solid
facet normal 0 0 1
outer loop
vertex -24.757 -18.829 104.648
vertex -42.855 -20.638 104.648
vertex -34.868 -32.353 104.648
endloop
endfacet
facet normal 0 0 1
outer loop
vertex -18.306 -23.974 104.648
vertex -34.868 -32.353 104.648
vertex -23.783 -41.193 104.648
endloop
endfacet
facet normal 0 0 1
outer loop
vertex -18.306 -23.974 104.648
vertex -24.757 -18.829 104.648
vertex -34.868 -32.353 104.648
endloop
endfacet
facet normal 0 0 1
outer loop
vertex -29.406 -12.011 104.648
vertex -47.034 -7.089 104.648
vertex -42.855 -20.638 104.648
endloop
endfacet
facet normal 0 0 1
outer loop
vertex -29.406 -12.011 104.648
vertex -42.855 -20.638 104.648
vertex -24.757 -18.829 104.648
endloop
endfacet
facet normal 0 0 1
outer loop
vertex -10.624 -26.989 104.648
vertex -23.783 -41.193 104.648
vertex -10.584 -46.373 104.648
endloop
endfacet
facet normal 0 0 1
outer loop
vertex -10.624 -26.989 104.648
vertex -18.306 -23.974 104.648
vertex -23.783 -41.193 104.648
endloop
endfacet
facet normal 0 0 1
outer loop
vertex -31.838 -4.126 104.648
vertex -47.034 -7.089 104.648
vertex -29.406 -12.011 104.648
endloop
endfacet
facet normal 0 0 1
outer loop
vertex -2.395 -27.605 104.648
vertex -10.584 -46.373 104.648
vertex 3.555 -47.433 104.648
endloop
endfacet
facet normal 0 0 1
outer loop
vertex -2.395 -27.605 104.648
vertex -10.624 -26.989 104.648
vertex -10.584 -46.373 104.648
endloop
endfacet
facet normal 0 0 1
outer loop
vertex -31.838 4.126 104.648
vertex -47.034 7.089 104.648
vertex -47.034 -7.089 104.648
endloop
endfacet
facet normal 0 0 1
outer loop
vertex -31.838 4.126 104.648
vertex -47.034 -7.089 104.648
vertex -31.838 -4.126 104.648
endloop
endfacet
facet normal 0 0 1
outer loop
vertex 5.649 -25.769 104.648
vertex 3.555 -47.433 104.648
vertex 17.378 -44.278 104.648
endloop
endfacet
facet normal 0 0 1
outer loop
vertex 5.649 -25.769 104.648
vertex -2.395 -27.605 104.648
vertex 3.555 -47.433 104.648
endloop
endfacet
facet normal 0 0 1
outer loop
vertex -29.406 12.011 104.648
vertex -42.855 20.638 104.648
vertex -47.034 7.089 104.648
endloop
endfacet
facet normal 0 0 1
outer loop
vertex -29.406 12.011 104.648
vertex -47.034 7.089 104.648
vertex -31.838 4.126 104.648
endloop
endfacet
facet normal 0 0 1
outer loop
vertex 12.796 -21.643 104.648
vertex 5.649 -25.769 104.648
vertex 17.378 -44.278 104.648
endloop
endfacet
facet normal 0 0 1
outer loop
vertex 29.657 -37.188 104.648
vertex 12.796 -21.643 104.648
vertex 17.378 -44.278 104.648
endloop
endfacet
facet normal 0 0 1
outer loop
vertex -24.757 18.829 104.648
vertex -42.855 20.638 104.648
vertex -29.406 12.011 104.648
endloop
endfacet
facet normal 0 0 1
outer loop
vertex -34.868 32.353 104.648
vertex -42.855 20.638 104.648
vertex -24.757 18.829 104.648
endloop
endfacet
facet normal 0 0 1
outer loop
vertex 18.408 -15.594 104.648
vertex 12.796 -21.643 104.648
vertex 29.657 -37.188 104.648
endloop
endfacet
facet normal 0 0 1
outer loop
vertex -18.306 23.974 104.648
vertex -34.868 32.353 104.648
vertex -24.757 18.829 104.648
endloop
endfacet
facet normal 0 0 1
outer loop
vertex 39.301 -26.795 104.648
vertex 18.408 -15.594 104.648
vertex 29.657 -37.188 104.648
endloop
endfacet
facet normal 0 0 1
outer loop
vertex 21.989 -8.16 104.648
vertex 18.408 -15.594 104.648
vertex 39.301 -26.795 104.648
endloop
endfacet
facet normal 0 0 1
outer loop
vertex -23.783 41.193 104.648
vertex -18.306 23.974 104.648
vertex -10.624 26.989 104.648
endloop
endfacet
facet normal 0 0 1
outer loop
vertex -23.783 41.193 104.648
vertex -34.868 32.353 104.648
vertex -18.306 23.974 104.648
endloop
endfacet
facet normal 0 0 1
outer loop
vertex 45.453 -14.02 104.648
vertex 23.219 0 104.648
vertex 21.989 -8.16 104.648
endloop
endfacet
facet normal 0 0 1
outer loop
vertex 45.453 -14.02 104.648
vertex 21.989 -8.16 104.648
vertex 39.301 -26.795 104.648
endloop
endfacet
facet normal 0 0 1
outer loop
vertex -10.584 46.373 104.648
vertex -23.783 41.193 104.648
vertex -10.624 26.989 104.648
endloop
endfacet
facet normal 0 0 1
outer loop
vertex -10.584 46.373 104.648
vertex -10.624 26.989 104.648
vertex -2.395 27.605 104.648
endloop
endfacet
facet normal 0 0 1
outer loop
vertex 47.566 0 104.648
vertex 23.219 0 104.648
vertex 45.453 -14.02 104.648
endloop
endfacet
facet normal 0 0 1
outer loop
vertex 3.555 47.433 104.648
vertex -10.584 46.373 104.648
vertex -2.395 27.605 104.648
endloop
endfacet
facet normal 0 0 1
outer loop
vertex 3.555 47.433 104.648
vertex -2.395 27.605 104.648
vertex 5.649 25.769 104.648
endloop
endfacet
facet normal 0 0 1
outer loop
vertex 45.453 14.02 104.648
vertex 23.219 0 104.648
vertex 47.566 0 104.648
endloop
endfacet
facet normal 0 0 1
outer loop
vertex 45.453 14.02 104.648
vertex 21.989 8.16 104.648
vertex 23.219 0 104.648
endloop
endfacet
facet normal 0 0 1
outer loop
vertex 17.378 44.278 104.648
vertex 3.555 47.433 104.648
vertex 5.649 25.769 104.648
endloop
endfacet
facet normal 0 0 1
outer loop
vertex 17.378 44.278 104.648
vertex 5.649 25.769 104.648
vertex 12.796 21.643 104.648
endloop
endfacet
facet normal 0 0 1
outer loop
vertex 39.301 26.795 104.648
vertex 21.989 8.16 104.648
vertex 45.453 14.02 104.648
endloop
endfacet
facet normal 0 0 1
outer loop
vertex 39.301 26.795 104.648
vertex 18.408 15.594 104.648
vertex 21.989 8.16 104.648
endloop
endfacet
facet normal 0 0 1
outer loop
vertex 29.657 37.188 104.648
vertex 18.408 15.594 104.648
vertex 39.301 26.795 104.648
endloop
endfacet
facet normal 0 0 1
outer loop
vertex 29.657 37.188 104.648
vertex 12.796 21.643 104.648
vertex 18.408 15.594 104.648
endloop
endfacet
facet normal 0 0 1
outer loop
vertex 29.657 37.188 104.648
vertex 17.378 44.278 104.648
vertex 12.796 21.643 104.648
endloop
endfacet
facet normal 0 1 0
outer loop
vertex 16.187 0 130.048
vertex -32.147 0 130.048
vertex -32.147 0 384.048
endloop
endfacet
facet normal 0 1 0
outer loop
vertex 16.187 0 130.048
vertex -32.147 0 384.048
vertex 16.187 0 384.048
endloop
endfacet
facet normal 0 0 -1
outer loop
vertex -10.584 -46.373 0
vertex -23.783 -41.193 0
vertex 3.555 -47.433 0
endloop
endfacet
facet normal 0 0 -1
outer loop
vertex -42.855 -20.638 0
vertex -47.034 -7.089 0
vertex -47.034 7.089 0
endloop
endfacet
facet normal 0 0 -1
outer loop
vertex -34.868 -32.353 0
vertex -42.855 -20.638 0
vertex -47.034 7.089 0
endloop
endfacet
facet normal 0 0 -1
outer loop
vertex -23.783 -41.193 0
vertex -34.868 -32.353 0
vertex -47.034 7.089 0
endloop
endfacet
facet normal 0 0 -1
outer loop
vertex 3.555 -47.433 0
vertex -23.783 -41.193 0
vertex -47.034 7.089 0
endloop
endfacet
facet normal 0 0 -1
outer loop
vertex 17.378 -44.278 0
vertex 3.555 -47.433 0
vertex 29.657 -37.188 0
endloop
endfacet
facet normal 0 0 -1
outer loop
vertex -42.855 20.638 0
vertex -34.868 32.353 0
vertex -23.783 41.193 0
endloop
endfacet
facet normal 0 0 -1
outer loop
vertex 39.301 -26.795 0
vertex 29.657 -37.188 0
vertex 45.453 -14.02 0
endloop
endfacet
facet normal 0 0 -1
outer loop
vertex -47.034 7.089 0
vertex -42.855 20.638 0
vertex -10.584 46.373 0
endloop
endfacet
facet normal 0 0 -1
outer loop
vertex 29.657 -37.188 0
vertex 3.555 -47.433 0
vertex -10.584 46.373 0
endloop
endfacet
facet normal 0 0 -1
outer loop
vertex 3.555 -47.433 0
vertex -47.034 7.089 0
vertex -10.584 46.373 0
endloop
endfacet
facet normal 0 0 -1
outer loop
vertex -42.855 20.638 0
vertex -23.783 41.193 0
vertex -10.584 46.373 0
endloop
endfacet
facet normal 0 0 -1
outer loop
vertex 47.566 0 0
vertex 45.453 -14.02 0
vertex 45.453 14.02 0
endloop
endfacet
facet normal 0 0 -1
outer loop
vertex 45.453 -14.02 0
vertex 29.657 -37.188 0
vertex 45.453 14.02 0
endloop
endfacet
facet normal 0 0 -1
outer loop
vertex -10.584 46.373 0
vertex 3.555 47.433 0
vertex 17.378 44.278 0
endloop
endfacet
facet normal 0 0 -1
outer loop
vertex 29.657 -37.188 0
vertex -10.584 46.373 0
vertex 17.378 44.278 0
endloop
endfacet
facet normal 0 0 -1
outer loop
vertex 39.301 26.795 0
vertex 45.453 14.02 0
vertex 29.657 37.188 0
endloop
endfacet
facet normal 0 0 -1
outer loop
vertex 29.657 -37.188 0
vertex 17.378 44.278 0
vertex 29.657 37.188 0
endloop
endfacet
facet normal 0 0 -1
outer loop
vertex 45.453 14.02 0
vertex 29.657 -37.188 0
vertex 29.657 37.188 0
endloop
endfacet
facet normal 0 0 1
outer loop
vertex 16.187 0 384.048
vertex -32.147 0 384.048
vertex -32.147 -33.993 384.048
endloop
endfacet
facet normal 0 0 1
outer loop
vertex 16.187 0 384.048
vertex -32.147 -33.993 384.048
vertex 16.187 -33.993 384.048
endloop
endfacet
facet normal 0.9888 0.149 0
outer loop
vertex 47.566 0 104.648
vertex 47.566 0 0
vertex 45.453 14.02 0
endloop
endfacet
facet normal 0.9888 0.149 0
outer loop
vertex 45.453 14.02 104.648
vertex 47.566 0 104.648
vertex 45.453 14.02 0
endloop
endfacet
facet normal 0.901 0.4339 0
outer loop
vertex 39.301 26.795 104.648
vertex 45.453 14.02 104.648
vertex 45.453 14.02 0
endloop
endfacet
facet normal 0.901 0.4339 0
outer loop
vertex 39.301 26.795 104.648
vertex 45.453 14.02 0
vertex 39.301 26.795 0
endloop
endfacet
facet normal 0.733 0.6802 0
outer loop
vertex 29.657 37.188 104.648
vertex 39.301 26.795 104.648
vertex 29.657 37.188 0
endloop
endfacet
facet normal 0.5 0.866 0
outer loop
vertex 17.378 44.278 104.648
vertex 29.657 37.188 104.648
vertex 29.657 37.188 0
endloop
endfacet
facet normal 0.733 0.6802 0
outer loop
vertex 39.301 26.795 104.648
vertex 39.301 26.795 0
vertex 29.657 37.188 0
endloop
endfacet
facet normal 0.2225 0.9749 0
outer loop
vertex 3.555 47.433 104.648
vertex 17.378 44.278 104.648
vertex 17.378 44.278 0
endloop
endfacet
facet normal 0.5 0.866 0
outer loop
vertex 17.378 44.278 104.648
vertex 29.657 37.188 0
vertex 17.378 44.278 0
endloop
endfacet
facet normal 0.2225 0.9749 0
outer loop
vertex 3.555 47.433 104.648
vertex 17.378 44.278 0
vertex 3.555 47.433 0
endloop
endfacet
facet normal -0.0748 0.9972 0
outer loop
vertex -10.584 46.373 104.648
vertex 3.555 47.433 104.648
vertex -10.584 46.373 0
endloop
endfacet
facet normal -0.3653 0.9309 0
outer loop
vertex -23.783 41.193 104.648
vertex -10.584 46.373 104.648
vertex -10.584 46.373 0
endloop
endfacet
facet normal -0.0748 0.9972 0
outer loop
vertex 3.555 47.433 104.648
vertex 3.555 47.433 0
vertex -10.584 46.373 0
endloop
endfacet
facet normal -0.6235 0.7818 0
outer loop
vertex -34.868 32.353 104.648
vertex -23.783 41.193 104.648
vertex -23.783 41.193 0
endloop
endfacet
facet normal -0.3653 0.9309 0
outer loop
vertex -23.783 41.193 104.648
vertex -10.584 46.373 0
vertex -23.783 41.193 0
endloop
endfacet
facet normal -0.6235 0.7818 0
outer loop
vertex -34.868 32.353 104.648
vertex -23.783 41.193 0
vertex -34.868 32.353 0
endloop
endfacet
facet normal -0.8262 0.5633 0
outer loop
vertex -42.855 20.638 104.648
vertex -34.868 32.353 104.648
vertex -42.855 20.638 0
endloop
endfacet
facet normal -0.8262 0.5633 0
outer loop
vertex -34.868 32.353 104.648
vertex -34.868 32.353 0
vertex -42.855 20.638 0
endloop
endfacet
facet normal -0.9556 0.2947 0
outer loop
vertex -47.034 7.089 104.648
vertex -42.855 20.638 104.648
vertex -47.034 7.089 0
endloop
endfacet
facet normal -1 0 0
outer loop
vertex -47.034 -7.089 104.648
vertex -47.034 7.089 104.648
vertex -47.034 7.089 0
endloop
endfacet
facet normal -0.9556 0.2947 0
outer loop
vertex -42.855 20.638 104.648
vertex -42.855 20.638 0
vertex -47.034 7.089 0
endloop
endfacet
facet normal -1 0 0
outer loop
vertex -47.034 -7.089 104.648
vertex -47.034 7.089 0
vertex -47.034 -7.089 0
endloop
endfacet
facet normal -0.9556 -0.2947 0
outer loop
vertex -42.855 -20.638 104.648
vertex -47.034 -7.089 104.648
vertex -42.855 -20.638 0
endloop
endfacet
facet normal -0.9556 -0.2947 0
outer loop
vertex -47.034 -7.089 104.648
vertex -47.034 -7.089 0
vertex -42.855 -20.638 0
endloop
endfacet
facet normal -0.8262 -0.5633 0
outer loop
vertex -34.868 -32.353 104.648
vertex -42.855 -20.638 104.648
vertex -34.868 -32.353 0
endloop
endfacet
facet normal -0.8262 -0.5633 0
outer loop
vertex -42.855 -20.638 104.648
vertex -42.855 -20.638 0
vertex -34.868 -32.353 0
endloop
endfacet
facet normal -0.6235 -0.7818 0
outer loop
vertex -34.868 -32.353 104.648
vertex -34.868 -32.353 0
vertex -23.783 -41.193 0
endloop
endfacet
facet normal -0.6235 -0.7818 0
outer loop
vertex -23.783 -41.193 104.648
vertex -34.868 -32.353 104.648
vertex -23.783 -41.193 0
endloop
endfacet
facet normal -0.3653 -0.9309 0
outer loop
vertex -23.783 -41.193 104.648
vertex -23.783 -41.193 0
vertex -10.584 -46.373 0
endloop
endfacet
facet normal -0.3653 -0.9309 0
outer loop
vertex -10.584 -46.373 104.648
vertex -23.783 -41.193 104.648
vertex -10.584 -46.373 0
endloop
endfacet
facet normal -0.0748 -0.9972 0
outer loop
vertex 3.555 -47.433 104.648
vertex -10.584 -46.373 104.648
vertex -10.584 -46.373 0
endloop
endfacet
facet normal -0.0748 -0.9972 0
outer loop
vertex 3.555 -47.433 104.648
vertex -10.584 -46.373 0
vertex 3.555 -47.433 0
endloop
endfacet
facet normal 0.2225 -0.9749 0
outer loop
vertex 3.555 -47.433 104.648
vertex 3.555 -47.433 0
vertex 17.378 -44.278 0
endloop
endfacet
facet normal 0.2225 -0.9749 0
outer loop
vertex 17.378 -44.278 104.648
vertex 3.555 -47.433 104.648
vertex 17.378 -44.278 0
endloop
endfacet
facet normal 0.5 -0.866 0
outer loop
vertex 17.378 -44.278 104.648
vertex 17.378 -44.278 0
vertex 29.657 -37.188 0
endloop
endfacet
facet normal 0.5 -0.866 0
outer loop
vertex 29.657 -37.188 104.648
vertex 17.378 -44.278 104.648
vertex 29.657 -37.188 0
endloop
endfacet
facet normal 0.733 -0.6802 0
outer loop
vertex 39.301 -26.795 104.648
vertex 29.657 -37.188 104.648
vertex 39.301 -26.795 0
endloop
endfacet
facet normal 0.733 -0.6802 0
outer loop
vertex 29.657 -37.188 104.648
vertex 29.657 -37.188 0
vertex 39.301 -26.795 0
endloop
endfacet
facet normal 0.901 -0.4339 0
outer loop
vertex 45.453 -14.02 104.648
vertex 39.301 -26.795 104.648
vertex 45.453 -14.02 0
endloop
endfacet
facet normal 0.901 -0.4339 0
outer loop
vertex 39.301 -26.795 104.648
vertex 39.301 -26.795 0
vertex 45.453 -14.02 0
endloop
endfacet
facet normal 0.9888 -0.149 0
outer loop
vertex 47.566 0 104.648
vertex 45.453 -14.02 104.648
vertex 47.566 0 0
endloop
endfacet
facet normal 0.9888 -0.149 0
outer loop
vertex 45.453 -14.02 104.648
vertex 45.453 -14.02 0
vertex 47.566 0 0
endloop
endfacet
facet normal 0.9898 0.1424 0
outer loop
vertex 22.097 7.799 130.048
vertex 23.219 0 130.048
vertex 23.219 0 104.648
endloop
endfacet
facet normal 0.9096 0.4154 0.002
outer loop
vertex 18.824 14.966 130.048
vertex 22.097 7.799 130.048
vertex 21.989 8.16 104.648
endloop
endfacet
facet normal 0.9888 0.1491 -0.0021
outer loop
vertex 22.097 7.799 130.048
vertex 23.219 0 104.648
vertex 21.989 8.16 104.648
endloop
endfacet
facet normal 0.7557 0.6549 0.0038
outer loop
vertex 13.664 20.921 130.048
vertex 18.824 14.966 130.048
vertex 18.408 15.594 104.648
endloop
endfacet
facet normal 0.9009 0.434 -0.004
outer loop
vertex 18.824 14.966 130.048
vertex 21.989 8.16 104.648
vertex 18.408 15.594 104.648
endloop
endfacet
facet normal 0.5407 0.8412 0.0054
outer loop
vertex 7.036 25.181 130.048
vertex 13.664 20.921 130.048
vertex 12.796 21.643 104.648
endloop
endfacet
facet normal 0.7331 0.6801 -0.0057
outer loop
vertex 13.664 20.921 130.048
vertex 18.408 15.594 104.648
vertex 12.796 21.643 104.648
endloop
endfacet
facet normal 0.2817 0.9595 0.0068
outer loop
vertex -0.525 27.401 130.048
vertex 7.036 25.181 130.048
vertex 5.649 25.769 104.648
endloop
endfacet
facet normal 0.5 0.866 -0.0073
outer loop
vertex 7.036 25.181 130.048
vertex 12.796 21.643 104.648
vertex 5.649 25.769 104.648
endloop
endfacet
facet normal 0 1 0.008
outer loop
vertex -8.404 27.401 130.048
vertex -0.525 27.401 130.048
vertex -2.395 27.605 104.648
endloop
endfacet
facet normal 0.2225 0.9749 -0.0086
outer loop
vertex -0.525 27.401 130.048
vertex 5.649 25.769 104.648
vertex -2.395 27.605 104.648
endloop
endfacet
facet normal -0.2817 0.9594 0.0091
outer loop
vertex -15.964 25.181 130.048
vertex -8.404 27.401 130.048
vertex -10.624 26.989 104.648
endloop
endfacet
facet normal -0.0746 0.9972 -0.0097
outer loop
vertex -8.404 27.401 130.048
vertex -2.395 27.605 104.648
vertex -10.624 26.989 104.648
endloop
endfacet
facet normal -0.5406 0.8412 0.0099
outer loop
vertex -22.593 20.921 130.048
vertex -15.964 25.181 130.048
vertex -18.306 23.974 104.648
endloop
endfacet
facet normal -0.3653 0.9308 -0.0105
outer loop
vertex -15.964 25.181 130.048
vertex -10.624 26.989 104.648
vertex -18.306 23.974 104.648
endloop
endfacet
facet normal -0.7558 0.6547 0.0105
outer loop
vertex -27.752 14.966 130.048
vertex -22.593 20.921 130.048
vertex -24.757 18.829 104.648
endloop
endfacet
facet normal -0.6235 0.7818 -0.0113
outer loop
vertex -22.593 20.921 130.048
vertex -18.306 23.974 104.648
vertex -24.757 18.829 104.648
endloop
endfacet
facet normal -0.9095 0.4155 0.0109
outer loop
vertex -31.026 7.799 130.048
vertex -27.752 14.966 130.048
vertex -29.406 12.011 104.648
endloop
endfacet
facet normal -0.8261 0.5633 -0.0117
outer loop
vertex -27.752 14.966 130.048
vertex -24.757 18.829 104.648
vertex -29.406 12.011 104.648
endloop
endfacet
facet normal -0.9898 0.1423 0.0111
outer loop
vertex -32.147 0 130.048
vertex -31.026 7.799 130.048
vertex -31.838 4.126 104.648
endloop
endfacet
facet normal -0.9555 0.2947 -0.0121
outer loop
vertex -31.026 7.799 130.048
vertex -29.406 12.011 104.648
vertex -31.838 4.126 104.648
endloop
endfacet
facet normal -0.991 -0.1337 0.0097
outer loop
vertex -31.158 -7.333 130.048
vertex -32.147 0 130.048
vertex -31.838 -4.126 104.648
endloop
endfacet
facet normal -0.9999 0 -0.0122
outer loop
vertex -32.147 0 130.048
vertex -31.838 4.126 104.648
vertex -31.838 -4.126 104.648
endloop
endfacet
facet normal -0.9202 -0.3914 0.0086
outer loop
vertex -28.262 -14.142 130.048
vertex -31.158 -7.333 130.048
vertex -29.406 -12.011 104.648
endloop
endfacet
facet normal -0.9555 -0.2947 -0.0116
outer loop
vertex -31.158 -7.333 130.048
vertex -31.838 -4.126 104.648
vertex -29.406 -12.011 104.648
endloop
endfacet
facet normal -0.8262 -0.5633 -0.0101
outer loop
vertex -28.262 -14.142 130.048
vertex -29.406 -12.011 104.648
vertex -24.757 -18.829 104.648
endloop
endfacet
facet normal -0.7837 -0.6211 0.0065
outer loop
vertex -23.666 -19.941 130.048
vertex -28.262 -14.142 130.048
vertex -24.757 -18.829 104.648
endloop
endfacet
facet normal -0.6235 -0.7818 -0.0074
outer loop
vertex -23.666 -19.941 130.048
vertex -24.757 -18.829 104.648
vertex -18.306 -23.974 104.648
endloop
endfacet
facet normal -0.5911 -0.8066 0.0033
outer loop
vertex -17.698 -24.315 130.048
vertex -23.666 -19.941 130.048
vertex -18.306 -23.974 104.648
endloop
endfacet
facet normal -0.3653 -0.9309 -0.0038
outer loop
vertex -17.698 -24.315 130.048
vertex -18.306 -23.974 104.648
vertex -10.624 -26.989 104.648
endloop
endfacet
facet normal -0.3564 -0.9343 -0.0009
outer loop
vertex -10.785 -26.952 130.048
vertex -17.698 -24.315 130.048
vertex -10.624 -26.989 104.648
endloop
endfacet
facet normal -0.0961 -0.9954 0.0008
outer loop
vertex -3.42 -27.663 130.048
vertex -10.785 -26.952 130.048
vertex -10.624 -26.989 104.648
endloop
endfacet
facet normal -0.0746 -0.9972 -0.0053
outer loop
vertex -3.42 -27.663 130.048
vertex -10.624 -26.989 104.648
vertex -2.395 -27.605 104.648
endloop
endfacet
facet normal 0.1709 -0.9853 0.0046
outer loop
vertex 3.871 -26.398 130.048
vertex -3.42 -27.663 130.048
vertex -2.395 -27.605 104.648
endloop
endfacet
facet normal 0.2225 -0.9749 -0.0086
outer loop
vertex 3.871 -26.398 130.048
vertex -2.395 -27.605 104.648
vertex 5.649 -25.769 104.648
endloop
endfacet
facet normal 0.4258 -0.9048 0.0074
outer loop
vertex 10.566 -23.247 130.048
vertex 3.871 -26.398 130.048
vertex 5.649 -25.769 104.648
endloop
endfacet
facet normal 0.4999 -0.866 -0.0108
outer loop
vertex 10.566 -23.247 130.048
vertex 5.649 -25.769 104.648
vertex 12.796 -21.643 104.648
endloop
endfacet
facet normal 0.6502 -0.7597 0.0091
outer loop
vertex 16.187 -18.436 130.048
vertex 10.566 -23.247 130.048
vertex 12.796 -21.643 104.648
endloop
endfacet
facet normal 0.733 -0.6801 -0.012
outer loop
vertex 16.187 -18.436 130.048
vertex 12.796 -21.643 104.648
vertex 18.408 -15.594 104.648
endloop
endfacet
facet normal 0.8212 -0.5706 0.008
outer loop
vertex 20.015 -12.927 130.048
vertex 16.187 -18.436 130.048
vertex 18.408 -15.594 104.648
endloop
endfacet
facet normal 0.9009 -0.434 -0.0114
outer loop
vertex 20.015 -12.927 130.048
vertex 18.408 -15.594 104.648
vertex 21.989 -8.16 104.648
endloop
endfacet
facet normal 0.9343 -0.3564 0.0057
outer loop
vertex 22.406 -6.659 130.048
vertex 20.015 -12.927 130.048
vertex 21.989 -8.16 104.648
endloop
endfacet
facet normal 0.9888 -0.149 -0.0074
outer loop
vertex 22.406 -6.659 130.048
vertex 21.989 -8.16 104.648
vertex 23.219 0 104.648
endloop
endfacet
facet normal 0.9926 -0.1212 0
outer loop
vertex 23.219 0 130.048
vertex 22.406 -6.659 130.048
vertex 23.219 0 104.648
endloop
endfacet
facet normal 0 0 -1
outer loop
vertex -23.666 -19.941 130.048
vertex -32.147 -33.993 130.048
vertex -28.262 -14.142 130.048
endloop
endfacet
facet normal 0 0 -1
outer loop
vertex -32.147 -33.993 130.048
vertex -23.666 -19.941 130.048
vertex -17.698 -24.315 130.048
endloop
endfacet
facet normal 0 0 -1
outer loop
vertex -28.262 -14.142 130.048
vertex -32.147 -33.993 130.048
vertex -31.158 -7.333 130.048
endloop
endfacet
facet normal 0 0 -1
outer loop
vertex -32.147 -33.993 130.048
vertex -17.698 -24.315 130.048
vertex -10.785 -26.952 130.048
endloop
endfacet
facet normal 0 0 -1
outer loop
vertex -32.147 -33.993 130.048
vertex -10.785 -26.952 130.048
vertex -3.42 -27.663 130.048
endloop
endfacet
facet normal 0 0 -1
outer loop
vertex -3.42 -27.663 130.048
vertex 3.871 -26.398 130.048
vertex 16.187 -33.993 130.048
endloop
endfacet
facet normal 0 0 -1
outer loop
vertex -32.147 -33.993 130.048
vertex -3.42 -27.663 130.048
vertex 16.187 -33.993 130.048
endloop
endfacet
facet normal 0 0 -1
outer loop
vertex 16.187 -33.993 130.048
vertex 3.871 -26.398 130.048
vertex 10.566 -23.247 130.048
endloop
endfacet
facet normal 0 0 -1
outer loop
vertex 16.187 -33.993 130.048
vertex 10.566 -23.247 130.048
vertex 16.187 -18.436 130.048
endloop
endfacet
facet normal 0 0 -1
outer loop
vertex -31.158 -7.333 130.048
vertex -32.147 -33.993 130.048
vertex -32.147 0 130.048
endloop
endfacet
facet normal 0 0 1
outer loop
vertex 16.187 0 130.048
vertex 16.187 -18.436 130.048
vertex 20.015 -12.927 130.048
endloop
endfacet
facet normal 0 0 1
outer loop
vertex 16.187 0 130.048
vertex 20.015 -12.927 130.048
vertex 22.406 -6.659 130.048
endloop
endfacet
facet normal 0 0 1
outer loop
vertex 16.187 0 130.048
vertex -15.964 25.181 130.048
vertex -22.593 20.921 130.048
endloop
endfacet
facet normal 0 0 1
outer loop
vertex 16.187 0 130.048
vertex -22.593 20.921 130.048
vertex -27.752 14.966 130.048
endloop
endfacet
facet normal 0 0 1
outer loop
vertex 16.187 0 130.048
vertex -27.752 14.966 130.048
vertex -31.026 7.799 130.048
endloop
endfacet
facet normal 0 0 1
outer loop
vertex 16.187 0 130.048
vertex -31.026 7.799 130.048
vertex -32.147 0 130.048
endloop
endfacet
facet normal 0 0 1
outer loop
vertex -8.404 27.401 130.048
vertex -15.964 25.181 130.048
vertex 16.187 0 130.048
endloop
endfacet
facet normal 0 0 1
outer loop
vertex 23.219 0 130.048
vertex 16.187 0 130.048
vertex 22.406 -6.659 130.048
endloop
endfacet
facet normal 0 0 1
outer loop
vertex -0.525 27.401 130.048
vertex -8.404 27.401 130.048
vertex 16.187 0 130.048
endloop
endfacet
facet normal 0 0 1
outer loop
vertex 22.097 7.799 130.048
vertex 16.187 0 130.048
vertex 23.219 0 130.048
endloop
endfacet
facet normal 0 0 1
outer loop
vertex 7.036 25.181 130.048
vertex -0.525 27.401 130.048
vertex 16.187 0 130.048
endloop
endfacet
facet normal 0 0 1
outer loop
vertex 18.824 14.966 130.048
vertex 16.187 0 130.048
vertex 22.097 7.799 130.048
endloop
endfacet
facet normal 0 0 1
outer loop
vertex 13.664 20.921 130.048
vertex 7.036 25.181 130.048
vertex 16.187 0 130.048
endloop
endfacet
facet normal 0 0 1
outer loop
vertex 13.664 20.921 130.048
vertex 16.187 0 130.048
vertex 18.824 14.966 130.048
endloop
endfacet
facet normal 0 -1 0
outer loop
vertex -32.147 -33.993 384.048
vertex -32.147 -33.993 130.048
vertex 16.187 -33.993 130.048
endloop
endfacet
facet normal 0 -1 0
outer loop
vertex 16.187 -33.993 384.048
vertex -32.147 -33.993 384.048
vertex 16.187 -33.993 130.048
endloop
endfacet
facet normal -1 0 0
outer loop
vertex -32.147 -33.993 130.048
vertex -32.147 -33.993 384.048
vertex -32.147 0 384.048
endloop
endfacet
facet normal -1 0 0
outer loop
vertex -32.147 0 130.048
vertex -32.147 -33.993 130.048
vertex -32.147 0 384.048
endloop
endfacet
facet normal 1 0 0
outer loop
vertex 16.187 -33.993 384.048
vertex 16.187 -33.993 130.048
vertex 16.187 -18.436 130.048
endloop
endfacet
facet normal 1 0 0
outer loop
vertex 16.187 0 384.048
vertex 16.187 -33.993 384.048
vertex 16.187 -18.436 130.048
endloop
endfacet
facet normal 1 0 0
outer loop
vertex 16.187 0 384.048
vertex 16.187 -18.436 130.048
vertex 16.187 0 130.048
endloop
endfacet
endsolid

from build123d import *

# Parameters (mm, degrees)
F0_R     = 47.56572
F1_DEPTH = 104.648
F2_R     = 27.682739
F3_DEPTH = 25.4
F4_W     = 48.33358
F4_H     = 33.992838
F5_DEPTH = 254


with BuildPart() as f1:
    # F0 (on Top) → F1 (new body)
    with BuildSketch(Plane.XY):
        Circle(F0_R)
    extrude(amount=F1_DEPTH)

    # F2 (on face) → F3 (join)
    with BuildSketch(Plane.XY.offset(104.648)):
        with Locations((-4.464226, 0)):
            Circle(F2_R)
    extrude(amount=F3_DEPTH)

    # F4 (on face) → F5 (join)
    with BuildSketch(Plane.XY.offset(130.048)):
        with Locations((-7.980175, -16.996419)):
            Rectangle(F4_W, F4_H)
    extrude(amount=F5_DEPTH)


solid = f1.part
